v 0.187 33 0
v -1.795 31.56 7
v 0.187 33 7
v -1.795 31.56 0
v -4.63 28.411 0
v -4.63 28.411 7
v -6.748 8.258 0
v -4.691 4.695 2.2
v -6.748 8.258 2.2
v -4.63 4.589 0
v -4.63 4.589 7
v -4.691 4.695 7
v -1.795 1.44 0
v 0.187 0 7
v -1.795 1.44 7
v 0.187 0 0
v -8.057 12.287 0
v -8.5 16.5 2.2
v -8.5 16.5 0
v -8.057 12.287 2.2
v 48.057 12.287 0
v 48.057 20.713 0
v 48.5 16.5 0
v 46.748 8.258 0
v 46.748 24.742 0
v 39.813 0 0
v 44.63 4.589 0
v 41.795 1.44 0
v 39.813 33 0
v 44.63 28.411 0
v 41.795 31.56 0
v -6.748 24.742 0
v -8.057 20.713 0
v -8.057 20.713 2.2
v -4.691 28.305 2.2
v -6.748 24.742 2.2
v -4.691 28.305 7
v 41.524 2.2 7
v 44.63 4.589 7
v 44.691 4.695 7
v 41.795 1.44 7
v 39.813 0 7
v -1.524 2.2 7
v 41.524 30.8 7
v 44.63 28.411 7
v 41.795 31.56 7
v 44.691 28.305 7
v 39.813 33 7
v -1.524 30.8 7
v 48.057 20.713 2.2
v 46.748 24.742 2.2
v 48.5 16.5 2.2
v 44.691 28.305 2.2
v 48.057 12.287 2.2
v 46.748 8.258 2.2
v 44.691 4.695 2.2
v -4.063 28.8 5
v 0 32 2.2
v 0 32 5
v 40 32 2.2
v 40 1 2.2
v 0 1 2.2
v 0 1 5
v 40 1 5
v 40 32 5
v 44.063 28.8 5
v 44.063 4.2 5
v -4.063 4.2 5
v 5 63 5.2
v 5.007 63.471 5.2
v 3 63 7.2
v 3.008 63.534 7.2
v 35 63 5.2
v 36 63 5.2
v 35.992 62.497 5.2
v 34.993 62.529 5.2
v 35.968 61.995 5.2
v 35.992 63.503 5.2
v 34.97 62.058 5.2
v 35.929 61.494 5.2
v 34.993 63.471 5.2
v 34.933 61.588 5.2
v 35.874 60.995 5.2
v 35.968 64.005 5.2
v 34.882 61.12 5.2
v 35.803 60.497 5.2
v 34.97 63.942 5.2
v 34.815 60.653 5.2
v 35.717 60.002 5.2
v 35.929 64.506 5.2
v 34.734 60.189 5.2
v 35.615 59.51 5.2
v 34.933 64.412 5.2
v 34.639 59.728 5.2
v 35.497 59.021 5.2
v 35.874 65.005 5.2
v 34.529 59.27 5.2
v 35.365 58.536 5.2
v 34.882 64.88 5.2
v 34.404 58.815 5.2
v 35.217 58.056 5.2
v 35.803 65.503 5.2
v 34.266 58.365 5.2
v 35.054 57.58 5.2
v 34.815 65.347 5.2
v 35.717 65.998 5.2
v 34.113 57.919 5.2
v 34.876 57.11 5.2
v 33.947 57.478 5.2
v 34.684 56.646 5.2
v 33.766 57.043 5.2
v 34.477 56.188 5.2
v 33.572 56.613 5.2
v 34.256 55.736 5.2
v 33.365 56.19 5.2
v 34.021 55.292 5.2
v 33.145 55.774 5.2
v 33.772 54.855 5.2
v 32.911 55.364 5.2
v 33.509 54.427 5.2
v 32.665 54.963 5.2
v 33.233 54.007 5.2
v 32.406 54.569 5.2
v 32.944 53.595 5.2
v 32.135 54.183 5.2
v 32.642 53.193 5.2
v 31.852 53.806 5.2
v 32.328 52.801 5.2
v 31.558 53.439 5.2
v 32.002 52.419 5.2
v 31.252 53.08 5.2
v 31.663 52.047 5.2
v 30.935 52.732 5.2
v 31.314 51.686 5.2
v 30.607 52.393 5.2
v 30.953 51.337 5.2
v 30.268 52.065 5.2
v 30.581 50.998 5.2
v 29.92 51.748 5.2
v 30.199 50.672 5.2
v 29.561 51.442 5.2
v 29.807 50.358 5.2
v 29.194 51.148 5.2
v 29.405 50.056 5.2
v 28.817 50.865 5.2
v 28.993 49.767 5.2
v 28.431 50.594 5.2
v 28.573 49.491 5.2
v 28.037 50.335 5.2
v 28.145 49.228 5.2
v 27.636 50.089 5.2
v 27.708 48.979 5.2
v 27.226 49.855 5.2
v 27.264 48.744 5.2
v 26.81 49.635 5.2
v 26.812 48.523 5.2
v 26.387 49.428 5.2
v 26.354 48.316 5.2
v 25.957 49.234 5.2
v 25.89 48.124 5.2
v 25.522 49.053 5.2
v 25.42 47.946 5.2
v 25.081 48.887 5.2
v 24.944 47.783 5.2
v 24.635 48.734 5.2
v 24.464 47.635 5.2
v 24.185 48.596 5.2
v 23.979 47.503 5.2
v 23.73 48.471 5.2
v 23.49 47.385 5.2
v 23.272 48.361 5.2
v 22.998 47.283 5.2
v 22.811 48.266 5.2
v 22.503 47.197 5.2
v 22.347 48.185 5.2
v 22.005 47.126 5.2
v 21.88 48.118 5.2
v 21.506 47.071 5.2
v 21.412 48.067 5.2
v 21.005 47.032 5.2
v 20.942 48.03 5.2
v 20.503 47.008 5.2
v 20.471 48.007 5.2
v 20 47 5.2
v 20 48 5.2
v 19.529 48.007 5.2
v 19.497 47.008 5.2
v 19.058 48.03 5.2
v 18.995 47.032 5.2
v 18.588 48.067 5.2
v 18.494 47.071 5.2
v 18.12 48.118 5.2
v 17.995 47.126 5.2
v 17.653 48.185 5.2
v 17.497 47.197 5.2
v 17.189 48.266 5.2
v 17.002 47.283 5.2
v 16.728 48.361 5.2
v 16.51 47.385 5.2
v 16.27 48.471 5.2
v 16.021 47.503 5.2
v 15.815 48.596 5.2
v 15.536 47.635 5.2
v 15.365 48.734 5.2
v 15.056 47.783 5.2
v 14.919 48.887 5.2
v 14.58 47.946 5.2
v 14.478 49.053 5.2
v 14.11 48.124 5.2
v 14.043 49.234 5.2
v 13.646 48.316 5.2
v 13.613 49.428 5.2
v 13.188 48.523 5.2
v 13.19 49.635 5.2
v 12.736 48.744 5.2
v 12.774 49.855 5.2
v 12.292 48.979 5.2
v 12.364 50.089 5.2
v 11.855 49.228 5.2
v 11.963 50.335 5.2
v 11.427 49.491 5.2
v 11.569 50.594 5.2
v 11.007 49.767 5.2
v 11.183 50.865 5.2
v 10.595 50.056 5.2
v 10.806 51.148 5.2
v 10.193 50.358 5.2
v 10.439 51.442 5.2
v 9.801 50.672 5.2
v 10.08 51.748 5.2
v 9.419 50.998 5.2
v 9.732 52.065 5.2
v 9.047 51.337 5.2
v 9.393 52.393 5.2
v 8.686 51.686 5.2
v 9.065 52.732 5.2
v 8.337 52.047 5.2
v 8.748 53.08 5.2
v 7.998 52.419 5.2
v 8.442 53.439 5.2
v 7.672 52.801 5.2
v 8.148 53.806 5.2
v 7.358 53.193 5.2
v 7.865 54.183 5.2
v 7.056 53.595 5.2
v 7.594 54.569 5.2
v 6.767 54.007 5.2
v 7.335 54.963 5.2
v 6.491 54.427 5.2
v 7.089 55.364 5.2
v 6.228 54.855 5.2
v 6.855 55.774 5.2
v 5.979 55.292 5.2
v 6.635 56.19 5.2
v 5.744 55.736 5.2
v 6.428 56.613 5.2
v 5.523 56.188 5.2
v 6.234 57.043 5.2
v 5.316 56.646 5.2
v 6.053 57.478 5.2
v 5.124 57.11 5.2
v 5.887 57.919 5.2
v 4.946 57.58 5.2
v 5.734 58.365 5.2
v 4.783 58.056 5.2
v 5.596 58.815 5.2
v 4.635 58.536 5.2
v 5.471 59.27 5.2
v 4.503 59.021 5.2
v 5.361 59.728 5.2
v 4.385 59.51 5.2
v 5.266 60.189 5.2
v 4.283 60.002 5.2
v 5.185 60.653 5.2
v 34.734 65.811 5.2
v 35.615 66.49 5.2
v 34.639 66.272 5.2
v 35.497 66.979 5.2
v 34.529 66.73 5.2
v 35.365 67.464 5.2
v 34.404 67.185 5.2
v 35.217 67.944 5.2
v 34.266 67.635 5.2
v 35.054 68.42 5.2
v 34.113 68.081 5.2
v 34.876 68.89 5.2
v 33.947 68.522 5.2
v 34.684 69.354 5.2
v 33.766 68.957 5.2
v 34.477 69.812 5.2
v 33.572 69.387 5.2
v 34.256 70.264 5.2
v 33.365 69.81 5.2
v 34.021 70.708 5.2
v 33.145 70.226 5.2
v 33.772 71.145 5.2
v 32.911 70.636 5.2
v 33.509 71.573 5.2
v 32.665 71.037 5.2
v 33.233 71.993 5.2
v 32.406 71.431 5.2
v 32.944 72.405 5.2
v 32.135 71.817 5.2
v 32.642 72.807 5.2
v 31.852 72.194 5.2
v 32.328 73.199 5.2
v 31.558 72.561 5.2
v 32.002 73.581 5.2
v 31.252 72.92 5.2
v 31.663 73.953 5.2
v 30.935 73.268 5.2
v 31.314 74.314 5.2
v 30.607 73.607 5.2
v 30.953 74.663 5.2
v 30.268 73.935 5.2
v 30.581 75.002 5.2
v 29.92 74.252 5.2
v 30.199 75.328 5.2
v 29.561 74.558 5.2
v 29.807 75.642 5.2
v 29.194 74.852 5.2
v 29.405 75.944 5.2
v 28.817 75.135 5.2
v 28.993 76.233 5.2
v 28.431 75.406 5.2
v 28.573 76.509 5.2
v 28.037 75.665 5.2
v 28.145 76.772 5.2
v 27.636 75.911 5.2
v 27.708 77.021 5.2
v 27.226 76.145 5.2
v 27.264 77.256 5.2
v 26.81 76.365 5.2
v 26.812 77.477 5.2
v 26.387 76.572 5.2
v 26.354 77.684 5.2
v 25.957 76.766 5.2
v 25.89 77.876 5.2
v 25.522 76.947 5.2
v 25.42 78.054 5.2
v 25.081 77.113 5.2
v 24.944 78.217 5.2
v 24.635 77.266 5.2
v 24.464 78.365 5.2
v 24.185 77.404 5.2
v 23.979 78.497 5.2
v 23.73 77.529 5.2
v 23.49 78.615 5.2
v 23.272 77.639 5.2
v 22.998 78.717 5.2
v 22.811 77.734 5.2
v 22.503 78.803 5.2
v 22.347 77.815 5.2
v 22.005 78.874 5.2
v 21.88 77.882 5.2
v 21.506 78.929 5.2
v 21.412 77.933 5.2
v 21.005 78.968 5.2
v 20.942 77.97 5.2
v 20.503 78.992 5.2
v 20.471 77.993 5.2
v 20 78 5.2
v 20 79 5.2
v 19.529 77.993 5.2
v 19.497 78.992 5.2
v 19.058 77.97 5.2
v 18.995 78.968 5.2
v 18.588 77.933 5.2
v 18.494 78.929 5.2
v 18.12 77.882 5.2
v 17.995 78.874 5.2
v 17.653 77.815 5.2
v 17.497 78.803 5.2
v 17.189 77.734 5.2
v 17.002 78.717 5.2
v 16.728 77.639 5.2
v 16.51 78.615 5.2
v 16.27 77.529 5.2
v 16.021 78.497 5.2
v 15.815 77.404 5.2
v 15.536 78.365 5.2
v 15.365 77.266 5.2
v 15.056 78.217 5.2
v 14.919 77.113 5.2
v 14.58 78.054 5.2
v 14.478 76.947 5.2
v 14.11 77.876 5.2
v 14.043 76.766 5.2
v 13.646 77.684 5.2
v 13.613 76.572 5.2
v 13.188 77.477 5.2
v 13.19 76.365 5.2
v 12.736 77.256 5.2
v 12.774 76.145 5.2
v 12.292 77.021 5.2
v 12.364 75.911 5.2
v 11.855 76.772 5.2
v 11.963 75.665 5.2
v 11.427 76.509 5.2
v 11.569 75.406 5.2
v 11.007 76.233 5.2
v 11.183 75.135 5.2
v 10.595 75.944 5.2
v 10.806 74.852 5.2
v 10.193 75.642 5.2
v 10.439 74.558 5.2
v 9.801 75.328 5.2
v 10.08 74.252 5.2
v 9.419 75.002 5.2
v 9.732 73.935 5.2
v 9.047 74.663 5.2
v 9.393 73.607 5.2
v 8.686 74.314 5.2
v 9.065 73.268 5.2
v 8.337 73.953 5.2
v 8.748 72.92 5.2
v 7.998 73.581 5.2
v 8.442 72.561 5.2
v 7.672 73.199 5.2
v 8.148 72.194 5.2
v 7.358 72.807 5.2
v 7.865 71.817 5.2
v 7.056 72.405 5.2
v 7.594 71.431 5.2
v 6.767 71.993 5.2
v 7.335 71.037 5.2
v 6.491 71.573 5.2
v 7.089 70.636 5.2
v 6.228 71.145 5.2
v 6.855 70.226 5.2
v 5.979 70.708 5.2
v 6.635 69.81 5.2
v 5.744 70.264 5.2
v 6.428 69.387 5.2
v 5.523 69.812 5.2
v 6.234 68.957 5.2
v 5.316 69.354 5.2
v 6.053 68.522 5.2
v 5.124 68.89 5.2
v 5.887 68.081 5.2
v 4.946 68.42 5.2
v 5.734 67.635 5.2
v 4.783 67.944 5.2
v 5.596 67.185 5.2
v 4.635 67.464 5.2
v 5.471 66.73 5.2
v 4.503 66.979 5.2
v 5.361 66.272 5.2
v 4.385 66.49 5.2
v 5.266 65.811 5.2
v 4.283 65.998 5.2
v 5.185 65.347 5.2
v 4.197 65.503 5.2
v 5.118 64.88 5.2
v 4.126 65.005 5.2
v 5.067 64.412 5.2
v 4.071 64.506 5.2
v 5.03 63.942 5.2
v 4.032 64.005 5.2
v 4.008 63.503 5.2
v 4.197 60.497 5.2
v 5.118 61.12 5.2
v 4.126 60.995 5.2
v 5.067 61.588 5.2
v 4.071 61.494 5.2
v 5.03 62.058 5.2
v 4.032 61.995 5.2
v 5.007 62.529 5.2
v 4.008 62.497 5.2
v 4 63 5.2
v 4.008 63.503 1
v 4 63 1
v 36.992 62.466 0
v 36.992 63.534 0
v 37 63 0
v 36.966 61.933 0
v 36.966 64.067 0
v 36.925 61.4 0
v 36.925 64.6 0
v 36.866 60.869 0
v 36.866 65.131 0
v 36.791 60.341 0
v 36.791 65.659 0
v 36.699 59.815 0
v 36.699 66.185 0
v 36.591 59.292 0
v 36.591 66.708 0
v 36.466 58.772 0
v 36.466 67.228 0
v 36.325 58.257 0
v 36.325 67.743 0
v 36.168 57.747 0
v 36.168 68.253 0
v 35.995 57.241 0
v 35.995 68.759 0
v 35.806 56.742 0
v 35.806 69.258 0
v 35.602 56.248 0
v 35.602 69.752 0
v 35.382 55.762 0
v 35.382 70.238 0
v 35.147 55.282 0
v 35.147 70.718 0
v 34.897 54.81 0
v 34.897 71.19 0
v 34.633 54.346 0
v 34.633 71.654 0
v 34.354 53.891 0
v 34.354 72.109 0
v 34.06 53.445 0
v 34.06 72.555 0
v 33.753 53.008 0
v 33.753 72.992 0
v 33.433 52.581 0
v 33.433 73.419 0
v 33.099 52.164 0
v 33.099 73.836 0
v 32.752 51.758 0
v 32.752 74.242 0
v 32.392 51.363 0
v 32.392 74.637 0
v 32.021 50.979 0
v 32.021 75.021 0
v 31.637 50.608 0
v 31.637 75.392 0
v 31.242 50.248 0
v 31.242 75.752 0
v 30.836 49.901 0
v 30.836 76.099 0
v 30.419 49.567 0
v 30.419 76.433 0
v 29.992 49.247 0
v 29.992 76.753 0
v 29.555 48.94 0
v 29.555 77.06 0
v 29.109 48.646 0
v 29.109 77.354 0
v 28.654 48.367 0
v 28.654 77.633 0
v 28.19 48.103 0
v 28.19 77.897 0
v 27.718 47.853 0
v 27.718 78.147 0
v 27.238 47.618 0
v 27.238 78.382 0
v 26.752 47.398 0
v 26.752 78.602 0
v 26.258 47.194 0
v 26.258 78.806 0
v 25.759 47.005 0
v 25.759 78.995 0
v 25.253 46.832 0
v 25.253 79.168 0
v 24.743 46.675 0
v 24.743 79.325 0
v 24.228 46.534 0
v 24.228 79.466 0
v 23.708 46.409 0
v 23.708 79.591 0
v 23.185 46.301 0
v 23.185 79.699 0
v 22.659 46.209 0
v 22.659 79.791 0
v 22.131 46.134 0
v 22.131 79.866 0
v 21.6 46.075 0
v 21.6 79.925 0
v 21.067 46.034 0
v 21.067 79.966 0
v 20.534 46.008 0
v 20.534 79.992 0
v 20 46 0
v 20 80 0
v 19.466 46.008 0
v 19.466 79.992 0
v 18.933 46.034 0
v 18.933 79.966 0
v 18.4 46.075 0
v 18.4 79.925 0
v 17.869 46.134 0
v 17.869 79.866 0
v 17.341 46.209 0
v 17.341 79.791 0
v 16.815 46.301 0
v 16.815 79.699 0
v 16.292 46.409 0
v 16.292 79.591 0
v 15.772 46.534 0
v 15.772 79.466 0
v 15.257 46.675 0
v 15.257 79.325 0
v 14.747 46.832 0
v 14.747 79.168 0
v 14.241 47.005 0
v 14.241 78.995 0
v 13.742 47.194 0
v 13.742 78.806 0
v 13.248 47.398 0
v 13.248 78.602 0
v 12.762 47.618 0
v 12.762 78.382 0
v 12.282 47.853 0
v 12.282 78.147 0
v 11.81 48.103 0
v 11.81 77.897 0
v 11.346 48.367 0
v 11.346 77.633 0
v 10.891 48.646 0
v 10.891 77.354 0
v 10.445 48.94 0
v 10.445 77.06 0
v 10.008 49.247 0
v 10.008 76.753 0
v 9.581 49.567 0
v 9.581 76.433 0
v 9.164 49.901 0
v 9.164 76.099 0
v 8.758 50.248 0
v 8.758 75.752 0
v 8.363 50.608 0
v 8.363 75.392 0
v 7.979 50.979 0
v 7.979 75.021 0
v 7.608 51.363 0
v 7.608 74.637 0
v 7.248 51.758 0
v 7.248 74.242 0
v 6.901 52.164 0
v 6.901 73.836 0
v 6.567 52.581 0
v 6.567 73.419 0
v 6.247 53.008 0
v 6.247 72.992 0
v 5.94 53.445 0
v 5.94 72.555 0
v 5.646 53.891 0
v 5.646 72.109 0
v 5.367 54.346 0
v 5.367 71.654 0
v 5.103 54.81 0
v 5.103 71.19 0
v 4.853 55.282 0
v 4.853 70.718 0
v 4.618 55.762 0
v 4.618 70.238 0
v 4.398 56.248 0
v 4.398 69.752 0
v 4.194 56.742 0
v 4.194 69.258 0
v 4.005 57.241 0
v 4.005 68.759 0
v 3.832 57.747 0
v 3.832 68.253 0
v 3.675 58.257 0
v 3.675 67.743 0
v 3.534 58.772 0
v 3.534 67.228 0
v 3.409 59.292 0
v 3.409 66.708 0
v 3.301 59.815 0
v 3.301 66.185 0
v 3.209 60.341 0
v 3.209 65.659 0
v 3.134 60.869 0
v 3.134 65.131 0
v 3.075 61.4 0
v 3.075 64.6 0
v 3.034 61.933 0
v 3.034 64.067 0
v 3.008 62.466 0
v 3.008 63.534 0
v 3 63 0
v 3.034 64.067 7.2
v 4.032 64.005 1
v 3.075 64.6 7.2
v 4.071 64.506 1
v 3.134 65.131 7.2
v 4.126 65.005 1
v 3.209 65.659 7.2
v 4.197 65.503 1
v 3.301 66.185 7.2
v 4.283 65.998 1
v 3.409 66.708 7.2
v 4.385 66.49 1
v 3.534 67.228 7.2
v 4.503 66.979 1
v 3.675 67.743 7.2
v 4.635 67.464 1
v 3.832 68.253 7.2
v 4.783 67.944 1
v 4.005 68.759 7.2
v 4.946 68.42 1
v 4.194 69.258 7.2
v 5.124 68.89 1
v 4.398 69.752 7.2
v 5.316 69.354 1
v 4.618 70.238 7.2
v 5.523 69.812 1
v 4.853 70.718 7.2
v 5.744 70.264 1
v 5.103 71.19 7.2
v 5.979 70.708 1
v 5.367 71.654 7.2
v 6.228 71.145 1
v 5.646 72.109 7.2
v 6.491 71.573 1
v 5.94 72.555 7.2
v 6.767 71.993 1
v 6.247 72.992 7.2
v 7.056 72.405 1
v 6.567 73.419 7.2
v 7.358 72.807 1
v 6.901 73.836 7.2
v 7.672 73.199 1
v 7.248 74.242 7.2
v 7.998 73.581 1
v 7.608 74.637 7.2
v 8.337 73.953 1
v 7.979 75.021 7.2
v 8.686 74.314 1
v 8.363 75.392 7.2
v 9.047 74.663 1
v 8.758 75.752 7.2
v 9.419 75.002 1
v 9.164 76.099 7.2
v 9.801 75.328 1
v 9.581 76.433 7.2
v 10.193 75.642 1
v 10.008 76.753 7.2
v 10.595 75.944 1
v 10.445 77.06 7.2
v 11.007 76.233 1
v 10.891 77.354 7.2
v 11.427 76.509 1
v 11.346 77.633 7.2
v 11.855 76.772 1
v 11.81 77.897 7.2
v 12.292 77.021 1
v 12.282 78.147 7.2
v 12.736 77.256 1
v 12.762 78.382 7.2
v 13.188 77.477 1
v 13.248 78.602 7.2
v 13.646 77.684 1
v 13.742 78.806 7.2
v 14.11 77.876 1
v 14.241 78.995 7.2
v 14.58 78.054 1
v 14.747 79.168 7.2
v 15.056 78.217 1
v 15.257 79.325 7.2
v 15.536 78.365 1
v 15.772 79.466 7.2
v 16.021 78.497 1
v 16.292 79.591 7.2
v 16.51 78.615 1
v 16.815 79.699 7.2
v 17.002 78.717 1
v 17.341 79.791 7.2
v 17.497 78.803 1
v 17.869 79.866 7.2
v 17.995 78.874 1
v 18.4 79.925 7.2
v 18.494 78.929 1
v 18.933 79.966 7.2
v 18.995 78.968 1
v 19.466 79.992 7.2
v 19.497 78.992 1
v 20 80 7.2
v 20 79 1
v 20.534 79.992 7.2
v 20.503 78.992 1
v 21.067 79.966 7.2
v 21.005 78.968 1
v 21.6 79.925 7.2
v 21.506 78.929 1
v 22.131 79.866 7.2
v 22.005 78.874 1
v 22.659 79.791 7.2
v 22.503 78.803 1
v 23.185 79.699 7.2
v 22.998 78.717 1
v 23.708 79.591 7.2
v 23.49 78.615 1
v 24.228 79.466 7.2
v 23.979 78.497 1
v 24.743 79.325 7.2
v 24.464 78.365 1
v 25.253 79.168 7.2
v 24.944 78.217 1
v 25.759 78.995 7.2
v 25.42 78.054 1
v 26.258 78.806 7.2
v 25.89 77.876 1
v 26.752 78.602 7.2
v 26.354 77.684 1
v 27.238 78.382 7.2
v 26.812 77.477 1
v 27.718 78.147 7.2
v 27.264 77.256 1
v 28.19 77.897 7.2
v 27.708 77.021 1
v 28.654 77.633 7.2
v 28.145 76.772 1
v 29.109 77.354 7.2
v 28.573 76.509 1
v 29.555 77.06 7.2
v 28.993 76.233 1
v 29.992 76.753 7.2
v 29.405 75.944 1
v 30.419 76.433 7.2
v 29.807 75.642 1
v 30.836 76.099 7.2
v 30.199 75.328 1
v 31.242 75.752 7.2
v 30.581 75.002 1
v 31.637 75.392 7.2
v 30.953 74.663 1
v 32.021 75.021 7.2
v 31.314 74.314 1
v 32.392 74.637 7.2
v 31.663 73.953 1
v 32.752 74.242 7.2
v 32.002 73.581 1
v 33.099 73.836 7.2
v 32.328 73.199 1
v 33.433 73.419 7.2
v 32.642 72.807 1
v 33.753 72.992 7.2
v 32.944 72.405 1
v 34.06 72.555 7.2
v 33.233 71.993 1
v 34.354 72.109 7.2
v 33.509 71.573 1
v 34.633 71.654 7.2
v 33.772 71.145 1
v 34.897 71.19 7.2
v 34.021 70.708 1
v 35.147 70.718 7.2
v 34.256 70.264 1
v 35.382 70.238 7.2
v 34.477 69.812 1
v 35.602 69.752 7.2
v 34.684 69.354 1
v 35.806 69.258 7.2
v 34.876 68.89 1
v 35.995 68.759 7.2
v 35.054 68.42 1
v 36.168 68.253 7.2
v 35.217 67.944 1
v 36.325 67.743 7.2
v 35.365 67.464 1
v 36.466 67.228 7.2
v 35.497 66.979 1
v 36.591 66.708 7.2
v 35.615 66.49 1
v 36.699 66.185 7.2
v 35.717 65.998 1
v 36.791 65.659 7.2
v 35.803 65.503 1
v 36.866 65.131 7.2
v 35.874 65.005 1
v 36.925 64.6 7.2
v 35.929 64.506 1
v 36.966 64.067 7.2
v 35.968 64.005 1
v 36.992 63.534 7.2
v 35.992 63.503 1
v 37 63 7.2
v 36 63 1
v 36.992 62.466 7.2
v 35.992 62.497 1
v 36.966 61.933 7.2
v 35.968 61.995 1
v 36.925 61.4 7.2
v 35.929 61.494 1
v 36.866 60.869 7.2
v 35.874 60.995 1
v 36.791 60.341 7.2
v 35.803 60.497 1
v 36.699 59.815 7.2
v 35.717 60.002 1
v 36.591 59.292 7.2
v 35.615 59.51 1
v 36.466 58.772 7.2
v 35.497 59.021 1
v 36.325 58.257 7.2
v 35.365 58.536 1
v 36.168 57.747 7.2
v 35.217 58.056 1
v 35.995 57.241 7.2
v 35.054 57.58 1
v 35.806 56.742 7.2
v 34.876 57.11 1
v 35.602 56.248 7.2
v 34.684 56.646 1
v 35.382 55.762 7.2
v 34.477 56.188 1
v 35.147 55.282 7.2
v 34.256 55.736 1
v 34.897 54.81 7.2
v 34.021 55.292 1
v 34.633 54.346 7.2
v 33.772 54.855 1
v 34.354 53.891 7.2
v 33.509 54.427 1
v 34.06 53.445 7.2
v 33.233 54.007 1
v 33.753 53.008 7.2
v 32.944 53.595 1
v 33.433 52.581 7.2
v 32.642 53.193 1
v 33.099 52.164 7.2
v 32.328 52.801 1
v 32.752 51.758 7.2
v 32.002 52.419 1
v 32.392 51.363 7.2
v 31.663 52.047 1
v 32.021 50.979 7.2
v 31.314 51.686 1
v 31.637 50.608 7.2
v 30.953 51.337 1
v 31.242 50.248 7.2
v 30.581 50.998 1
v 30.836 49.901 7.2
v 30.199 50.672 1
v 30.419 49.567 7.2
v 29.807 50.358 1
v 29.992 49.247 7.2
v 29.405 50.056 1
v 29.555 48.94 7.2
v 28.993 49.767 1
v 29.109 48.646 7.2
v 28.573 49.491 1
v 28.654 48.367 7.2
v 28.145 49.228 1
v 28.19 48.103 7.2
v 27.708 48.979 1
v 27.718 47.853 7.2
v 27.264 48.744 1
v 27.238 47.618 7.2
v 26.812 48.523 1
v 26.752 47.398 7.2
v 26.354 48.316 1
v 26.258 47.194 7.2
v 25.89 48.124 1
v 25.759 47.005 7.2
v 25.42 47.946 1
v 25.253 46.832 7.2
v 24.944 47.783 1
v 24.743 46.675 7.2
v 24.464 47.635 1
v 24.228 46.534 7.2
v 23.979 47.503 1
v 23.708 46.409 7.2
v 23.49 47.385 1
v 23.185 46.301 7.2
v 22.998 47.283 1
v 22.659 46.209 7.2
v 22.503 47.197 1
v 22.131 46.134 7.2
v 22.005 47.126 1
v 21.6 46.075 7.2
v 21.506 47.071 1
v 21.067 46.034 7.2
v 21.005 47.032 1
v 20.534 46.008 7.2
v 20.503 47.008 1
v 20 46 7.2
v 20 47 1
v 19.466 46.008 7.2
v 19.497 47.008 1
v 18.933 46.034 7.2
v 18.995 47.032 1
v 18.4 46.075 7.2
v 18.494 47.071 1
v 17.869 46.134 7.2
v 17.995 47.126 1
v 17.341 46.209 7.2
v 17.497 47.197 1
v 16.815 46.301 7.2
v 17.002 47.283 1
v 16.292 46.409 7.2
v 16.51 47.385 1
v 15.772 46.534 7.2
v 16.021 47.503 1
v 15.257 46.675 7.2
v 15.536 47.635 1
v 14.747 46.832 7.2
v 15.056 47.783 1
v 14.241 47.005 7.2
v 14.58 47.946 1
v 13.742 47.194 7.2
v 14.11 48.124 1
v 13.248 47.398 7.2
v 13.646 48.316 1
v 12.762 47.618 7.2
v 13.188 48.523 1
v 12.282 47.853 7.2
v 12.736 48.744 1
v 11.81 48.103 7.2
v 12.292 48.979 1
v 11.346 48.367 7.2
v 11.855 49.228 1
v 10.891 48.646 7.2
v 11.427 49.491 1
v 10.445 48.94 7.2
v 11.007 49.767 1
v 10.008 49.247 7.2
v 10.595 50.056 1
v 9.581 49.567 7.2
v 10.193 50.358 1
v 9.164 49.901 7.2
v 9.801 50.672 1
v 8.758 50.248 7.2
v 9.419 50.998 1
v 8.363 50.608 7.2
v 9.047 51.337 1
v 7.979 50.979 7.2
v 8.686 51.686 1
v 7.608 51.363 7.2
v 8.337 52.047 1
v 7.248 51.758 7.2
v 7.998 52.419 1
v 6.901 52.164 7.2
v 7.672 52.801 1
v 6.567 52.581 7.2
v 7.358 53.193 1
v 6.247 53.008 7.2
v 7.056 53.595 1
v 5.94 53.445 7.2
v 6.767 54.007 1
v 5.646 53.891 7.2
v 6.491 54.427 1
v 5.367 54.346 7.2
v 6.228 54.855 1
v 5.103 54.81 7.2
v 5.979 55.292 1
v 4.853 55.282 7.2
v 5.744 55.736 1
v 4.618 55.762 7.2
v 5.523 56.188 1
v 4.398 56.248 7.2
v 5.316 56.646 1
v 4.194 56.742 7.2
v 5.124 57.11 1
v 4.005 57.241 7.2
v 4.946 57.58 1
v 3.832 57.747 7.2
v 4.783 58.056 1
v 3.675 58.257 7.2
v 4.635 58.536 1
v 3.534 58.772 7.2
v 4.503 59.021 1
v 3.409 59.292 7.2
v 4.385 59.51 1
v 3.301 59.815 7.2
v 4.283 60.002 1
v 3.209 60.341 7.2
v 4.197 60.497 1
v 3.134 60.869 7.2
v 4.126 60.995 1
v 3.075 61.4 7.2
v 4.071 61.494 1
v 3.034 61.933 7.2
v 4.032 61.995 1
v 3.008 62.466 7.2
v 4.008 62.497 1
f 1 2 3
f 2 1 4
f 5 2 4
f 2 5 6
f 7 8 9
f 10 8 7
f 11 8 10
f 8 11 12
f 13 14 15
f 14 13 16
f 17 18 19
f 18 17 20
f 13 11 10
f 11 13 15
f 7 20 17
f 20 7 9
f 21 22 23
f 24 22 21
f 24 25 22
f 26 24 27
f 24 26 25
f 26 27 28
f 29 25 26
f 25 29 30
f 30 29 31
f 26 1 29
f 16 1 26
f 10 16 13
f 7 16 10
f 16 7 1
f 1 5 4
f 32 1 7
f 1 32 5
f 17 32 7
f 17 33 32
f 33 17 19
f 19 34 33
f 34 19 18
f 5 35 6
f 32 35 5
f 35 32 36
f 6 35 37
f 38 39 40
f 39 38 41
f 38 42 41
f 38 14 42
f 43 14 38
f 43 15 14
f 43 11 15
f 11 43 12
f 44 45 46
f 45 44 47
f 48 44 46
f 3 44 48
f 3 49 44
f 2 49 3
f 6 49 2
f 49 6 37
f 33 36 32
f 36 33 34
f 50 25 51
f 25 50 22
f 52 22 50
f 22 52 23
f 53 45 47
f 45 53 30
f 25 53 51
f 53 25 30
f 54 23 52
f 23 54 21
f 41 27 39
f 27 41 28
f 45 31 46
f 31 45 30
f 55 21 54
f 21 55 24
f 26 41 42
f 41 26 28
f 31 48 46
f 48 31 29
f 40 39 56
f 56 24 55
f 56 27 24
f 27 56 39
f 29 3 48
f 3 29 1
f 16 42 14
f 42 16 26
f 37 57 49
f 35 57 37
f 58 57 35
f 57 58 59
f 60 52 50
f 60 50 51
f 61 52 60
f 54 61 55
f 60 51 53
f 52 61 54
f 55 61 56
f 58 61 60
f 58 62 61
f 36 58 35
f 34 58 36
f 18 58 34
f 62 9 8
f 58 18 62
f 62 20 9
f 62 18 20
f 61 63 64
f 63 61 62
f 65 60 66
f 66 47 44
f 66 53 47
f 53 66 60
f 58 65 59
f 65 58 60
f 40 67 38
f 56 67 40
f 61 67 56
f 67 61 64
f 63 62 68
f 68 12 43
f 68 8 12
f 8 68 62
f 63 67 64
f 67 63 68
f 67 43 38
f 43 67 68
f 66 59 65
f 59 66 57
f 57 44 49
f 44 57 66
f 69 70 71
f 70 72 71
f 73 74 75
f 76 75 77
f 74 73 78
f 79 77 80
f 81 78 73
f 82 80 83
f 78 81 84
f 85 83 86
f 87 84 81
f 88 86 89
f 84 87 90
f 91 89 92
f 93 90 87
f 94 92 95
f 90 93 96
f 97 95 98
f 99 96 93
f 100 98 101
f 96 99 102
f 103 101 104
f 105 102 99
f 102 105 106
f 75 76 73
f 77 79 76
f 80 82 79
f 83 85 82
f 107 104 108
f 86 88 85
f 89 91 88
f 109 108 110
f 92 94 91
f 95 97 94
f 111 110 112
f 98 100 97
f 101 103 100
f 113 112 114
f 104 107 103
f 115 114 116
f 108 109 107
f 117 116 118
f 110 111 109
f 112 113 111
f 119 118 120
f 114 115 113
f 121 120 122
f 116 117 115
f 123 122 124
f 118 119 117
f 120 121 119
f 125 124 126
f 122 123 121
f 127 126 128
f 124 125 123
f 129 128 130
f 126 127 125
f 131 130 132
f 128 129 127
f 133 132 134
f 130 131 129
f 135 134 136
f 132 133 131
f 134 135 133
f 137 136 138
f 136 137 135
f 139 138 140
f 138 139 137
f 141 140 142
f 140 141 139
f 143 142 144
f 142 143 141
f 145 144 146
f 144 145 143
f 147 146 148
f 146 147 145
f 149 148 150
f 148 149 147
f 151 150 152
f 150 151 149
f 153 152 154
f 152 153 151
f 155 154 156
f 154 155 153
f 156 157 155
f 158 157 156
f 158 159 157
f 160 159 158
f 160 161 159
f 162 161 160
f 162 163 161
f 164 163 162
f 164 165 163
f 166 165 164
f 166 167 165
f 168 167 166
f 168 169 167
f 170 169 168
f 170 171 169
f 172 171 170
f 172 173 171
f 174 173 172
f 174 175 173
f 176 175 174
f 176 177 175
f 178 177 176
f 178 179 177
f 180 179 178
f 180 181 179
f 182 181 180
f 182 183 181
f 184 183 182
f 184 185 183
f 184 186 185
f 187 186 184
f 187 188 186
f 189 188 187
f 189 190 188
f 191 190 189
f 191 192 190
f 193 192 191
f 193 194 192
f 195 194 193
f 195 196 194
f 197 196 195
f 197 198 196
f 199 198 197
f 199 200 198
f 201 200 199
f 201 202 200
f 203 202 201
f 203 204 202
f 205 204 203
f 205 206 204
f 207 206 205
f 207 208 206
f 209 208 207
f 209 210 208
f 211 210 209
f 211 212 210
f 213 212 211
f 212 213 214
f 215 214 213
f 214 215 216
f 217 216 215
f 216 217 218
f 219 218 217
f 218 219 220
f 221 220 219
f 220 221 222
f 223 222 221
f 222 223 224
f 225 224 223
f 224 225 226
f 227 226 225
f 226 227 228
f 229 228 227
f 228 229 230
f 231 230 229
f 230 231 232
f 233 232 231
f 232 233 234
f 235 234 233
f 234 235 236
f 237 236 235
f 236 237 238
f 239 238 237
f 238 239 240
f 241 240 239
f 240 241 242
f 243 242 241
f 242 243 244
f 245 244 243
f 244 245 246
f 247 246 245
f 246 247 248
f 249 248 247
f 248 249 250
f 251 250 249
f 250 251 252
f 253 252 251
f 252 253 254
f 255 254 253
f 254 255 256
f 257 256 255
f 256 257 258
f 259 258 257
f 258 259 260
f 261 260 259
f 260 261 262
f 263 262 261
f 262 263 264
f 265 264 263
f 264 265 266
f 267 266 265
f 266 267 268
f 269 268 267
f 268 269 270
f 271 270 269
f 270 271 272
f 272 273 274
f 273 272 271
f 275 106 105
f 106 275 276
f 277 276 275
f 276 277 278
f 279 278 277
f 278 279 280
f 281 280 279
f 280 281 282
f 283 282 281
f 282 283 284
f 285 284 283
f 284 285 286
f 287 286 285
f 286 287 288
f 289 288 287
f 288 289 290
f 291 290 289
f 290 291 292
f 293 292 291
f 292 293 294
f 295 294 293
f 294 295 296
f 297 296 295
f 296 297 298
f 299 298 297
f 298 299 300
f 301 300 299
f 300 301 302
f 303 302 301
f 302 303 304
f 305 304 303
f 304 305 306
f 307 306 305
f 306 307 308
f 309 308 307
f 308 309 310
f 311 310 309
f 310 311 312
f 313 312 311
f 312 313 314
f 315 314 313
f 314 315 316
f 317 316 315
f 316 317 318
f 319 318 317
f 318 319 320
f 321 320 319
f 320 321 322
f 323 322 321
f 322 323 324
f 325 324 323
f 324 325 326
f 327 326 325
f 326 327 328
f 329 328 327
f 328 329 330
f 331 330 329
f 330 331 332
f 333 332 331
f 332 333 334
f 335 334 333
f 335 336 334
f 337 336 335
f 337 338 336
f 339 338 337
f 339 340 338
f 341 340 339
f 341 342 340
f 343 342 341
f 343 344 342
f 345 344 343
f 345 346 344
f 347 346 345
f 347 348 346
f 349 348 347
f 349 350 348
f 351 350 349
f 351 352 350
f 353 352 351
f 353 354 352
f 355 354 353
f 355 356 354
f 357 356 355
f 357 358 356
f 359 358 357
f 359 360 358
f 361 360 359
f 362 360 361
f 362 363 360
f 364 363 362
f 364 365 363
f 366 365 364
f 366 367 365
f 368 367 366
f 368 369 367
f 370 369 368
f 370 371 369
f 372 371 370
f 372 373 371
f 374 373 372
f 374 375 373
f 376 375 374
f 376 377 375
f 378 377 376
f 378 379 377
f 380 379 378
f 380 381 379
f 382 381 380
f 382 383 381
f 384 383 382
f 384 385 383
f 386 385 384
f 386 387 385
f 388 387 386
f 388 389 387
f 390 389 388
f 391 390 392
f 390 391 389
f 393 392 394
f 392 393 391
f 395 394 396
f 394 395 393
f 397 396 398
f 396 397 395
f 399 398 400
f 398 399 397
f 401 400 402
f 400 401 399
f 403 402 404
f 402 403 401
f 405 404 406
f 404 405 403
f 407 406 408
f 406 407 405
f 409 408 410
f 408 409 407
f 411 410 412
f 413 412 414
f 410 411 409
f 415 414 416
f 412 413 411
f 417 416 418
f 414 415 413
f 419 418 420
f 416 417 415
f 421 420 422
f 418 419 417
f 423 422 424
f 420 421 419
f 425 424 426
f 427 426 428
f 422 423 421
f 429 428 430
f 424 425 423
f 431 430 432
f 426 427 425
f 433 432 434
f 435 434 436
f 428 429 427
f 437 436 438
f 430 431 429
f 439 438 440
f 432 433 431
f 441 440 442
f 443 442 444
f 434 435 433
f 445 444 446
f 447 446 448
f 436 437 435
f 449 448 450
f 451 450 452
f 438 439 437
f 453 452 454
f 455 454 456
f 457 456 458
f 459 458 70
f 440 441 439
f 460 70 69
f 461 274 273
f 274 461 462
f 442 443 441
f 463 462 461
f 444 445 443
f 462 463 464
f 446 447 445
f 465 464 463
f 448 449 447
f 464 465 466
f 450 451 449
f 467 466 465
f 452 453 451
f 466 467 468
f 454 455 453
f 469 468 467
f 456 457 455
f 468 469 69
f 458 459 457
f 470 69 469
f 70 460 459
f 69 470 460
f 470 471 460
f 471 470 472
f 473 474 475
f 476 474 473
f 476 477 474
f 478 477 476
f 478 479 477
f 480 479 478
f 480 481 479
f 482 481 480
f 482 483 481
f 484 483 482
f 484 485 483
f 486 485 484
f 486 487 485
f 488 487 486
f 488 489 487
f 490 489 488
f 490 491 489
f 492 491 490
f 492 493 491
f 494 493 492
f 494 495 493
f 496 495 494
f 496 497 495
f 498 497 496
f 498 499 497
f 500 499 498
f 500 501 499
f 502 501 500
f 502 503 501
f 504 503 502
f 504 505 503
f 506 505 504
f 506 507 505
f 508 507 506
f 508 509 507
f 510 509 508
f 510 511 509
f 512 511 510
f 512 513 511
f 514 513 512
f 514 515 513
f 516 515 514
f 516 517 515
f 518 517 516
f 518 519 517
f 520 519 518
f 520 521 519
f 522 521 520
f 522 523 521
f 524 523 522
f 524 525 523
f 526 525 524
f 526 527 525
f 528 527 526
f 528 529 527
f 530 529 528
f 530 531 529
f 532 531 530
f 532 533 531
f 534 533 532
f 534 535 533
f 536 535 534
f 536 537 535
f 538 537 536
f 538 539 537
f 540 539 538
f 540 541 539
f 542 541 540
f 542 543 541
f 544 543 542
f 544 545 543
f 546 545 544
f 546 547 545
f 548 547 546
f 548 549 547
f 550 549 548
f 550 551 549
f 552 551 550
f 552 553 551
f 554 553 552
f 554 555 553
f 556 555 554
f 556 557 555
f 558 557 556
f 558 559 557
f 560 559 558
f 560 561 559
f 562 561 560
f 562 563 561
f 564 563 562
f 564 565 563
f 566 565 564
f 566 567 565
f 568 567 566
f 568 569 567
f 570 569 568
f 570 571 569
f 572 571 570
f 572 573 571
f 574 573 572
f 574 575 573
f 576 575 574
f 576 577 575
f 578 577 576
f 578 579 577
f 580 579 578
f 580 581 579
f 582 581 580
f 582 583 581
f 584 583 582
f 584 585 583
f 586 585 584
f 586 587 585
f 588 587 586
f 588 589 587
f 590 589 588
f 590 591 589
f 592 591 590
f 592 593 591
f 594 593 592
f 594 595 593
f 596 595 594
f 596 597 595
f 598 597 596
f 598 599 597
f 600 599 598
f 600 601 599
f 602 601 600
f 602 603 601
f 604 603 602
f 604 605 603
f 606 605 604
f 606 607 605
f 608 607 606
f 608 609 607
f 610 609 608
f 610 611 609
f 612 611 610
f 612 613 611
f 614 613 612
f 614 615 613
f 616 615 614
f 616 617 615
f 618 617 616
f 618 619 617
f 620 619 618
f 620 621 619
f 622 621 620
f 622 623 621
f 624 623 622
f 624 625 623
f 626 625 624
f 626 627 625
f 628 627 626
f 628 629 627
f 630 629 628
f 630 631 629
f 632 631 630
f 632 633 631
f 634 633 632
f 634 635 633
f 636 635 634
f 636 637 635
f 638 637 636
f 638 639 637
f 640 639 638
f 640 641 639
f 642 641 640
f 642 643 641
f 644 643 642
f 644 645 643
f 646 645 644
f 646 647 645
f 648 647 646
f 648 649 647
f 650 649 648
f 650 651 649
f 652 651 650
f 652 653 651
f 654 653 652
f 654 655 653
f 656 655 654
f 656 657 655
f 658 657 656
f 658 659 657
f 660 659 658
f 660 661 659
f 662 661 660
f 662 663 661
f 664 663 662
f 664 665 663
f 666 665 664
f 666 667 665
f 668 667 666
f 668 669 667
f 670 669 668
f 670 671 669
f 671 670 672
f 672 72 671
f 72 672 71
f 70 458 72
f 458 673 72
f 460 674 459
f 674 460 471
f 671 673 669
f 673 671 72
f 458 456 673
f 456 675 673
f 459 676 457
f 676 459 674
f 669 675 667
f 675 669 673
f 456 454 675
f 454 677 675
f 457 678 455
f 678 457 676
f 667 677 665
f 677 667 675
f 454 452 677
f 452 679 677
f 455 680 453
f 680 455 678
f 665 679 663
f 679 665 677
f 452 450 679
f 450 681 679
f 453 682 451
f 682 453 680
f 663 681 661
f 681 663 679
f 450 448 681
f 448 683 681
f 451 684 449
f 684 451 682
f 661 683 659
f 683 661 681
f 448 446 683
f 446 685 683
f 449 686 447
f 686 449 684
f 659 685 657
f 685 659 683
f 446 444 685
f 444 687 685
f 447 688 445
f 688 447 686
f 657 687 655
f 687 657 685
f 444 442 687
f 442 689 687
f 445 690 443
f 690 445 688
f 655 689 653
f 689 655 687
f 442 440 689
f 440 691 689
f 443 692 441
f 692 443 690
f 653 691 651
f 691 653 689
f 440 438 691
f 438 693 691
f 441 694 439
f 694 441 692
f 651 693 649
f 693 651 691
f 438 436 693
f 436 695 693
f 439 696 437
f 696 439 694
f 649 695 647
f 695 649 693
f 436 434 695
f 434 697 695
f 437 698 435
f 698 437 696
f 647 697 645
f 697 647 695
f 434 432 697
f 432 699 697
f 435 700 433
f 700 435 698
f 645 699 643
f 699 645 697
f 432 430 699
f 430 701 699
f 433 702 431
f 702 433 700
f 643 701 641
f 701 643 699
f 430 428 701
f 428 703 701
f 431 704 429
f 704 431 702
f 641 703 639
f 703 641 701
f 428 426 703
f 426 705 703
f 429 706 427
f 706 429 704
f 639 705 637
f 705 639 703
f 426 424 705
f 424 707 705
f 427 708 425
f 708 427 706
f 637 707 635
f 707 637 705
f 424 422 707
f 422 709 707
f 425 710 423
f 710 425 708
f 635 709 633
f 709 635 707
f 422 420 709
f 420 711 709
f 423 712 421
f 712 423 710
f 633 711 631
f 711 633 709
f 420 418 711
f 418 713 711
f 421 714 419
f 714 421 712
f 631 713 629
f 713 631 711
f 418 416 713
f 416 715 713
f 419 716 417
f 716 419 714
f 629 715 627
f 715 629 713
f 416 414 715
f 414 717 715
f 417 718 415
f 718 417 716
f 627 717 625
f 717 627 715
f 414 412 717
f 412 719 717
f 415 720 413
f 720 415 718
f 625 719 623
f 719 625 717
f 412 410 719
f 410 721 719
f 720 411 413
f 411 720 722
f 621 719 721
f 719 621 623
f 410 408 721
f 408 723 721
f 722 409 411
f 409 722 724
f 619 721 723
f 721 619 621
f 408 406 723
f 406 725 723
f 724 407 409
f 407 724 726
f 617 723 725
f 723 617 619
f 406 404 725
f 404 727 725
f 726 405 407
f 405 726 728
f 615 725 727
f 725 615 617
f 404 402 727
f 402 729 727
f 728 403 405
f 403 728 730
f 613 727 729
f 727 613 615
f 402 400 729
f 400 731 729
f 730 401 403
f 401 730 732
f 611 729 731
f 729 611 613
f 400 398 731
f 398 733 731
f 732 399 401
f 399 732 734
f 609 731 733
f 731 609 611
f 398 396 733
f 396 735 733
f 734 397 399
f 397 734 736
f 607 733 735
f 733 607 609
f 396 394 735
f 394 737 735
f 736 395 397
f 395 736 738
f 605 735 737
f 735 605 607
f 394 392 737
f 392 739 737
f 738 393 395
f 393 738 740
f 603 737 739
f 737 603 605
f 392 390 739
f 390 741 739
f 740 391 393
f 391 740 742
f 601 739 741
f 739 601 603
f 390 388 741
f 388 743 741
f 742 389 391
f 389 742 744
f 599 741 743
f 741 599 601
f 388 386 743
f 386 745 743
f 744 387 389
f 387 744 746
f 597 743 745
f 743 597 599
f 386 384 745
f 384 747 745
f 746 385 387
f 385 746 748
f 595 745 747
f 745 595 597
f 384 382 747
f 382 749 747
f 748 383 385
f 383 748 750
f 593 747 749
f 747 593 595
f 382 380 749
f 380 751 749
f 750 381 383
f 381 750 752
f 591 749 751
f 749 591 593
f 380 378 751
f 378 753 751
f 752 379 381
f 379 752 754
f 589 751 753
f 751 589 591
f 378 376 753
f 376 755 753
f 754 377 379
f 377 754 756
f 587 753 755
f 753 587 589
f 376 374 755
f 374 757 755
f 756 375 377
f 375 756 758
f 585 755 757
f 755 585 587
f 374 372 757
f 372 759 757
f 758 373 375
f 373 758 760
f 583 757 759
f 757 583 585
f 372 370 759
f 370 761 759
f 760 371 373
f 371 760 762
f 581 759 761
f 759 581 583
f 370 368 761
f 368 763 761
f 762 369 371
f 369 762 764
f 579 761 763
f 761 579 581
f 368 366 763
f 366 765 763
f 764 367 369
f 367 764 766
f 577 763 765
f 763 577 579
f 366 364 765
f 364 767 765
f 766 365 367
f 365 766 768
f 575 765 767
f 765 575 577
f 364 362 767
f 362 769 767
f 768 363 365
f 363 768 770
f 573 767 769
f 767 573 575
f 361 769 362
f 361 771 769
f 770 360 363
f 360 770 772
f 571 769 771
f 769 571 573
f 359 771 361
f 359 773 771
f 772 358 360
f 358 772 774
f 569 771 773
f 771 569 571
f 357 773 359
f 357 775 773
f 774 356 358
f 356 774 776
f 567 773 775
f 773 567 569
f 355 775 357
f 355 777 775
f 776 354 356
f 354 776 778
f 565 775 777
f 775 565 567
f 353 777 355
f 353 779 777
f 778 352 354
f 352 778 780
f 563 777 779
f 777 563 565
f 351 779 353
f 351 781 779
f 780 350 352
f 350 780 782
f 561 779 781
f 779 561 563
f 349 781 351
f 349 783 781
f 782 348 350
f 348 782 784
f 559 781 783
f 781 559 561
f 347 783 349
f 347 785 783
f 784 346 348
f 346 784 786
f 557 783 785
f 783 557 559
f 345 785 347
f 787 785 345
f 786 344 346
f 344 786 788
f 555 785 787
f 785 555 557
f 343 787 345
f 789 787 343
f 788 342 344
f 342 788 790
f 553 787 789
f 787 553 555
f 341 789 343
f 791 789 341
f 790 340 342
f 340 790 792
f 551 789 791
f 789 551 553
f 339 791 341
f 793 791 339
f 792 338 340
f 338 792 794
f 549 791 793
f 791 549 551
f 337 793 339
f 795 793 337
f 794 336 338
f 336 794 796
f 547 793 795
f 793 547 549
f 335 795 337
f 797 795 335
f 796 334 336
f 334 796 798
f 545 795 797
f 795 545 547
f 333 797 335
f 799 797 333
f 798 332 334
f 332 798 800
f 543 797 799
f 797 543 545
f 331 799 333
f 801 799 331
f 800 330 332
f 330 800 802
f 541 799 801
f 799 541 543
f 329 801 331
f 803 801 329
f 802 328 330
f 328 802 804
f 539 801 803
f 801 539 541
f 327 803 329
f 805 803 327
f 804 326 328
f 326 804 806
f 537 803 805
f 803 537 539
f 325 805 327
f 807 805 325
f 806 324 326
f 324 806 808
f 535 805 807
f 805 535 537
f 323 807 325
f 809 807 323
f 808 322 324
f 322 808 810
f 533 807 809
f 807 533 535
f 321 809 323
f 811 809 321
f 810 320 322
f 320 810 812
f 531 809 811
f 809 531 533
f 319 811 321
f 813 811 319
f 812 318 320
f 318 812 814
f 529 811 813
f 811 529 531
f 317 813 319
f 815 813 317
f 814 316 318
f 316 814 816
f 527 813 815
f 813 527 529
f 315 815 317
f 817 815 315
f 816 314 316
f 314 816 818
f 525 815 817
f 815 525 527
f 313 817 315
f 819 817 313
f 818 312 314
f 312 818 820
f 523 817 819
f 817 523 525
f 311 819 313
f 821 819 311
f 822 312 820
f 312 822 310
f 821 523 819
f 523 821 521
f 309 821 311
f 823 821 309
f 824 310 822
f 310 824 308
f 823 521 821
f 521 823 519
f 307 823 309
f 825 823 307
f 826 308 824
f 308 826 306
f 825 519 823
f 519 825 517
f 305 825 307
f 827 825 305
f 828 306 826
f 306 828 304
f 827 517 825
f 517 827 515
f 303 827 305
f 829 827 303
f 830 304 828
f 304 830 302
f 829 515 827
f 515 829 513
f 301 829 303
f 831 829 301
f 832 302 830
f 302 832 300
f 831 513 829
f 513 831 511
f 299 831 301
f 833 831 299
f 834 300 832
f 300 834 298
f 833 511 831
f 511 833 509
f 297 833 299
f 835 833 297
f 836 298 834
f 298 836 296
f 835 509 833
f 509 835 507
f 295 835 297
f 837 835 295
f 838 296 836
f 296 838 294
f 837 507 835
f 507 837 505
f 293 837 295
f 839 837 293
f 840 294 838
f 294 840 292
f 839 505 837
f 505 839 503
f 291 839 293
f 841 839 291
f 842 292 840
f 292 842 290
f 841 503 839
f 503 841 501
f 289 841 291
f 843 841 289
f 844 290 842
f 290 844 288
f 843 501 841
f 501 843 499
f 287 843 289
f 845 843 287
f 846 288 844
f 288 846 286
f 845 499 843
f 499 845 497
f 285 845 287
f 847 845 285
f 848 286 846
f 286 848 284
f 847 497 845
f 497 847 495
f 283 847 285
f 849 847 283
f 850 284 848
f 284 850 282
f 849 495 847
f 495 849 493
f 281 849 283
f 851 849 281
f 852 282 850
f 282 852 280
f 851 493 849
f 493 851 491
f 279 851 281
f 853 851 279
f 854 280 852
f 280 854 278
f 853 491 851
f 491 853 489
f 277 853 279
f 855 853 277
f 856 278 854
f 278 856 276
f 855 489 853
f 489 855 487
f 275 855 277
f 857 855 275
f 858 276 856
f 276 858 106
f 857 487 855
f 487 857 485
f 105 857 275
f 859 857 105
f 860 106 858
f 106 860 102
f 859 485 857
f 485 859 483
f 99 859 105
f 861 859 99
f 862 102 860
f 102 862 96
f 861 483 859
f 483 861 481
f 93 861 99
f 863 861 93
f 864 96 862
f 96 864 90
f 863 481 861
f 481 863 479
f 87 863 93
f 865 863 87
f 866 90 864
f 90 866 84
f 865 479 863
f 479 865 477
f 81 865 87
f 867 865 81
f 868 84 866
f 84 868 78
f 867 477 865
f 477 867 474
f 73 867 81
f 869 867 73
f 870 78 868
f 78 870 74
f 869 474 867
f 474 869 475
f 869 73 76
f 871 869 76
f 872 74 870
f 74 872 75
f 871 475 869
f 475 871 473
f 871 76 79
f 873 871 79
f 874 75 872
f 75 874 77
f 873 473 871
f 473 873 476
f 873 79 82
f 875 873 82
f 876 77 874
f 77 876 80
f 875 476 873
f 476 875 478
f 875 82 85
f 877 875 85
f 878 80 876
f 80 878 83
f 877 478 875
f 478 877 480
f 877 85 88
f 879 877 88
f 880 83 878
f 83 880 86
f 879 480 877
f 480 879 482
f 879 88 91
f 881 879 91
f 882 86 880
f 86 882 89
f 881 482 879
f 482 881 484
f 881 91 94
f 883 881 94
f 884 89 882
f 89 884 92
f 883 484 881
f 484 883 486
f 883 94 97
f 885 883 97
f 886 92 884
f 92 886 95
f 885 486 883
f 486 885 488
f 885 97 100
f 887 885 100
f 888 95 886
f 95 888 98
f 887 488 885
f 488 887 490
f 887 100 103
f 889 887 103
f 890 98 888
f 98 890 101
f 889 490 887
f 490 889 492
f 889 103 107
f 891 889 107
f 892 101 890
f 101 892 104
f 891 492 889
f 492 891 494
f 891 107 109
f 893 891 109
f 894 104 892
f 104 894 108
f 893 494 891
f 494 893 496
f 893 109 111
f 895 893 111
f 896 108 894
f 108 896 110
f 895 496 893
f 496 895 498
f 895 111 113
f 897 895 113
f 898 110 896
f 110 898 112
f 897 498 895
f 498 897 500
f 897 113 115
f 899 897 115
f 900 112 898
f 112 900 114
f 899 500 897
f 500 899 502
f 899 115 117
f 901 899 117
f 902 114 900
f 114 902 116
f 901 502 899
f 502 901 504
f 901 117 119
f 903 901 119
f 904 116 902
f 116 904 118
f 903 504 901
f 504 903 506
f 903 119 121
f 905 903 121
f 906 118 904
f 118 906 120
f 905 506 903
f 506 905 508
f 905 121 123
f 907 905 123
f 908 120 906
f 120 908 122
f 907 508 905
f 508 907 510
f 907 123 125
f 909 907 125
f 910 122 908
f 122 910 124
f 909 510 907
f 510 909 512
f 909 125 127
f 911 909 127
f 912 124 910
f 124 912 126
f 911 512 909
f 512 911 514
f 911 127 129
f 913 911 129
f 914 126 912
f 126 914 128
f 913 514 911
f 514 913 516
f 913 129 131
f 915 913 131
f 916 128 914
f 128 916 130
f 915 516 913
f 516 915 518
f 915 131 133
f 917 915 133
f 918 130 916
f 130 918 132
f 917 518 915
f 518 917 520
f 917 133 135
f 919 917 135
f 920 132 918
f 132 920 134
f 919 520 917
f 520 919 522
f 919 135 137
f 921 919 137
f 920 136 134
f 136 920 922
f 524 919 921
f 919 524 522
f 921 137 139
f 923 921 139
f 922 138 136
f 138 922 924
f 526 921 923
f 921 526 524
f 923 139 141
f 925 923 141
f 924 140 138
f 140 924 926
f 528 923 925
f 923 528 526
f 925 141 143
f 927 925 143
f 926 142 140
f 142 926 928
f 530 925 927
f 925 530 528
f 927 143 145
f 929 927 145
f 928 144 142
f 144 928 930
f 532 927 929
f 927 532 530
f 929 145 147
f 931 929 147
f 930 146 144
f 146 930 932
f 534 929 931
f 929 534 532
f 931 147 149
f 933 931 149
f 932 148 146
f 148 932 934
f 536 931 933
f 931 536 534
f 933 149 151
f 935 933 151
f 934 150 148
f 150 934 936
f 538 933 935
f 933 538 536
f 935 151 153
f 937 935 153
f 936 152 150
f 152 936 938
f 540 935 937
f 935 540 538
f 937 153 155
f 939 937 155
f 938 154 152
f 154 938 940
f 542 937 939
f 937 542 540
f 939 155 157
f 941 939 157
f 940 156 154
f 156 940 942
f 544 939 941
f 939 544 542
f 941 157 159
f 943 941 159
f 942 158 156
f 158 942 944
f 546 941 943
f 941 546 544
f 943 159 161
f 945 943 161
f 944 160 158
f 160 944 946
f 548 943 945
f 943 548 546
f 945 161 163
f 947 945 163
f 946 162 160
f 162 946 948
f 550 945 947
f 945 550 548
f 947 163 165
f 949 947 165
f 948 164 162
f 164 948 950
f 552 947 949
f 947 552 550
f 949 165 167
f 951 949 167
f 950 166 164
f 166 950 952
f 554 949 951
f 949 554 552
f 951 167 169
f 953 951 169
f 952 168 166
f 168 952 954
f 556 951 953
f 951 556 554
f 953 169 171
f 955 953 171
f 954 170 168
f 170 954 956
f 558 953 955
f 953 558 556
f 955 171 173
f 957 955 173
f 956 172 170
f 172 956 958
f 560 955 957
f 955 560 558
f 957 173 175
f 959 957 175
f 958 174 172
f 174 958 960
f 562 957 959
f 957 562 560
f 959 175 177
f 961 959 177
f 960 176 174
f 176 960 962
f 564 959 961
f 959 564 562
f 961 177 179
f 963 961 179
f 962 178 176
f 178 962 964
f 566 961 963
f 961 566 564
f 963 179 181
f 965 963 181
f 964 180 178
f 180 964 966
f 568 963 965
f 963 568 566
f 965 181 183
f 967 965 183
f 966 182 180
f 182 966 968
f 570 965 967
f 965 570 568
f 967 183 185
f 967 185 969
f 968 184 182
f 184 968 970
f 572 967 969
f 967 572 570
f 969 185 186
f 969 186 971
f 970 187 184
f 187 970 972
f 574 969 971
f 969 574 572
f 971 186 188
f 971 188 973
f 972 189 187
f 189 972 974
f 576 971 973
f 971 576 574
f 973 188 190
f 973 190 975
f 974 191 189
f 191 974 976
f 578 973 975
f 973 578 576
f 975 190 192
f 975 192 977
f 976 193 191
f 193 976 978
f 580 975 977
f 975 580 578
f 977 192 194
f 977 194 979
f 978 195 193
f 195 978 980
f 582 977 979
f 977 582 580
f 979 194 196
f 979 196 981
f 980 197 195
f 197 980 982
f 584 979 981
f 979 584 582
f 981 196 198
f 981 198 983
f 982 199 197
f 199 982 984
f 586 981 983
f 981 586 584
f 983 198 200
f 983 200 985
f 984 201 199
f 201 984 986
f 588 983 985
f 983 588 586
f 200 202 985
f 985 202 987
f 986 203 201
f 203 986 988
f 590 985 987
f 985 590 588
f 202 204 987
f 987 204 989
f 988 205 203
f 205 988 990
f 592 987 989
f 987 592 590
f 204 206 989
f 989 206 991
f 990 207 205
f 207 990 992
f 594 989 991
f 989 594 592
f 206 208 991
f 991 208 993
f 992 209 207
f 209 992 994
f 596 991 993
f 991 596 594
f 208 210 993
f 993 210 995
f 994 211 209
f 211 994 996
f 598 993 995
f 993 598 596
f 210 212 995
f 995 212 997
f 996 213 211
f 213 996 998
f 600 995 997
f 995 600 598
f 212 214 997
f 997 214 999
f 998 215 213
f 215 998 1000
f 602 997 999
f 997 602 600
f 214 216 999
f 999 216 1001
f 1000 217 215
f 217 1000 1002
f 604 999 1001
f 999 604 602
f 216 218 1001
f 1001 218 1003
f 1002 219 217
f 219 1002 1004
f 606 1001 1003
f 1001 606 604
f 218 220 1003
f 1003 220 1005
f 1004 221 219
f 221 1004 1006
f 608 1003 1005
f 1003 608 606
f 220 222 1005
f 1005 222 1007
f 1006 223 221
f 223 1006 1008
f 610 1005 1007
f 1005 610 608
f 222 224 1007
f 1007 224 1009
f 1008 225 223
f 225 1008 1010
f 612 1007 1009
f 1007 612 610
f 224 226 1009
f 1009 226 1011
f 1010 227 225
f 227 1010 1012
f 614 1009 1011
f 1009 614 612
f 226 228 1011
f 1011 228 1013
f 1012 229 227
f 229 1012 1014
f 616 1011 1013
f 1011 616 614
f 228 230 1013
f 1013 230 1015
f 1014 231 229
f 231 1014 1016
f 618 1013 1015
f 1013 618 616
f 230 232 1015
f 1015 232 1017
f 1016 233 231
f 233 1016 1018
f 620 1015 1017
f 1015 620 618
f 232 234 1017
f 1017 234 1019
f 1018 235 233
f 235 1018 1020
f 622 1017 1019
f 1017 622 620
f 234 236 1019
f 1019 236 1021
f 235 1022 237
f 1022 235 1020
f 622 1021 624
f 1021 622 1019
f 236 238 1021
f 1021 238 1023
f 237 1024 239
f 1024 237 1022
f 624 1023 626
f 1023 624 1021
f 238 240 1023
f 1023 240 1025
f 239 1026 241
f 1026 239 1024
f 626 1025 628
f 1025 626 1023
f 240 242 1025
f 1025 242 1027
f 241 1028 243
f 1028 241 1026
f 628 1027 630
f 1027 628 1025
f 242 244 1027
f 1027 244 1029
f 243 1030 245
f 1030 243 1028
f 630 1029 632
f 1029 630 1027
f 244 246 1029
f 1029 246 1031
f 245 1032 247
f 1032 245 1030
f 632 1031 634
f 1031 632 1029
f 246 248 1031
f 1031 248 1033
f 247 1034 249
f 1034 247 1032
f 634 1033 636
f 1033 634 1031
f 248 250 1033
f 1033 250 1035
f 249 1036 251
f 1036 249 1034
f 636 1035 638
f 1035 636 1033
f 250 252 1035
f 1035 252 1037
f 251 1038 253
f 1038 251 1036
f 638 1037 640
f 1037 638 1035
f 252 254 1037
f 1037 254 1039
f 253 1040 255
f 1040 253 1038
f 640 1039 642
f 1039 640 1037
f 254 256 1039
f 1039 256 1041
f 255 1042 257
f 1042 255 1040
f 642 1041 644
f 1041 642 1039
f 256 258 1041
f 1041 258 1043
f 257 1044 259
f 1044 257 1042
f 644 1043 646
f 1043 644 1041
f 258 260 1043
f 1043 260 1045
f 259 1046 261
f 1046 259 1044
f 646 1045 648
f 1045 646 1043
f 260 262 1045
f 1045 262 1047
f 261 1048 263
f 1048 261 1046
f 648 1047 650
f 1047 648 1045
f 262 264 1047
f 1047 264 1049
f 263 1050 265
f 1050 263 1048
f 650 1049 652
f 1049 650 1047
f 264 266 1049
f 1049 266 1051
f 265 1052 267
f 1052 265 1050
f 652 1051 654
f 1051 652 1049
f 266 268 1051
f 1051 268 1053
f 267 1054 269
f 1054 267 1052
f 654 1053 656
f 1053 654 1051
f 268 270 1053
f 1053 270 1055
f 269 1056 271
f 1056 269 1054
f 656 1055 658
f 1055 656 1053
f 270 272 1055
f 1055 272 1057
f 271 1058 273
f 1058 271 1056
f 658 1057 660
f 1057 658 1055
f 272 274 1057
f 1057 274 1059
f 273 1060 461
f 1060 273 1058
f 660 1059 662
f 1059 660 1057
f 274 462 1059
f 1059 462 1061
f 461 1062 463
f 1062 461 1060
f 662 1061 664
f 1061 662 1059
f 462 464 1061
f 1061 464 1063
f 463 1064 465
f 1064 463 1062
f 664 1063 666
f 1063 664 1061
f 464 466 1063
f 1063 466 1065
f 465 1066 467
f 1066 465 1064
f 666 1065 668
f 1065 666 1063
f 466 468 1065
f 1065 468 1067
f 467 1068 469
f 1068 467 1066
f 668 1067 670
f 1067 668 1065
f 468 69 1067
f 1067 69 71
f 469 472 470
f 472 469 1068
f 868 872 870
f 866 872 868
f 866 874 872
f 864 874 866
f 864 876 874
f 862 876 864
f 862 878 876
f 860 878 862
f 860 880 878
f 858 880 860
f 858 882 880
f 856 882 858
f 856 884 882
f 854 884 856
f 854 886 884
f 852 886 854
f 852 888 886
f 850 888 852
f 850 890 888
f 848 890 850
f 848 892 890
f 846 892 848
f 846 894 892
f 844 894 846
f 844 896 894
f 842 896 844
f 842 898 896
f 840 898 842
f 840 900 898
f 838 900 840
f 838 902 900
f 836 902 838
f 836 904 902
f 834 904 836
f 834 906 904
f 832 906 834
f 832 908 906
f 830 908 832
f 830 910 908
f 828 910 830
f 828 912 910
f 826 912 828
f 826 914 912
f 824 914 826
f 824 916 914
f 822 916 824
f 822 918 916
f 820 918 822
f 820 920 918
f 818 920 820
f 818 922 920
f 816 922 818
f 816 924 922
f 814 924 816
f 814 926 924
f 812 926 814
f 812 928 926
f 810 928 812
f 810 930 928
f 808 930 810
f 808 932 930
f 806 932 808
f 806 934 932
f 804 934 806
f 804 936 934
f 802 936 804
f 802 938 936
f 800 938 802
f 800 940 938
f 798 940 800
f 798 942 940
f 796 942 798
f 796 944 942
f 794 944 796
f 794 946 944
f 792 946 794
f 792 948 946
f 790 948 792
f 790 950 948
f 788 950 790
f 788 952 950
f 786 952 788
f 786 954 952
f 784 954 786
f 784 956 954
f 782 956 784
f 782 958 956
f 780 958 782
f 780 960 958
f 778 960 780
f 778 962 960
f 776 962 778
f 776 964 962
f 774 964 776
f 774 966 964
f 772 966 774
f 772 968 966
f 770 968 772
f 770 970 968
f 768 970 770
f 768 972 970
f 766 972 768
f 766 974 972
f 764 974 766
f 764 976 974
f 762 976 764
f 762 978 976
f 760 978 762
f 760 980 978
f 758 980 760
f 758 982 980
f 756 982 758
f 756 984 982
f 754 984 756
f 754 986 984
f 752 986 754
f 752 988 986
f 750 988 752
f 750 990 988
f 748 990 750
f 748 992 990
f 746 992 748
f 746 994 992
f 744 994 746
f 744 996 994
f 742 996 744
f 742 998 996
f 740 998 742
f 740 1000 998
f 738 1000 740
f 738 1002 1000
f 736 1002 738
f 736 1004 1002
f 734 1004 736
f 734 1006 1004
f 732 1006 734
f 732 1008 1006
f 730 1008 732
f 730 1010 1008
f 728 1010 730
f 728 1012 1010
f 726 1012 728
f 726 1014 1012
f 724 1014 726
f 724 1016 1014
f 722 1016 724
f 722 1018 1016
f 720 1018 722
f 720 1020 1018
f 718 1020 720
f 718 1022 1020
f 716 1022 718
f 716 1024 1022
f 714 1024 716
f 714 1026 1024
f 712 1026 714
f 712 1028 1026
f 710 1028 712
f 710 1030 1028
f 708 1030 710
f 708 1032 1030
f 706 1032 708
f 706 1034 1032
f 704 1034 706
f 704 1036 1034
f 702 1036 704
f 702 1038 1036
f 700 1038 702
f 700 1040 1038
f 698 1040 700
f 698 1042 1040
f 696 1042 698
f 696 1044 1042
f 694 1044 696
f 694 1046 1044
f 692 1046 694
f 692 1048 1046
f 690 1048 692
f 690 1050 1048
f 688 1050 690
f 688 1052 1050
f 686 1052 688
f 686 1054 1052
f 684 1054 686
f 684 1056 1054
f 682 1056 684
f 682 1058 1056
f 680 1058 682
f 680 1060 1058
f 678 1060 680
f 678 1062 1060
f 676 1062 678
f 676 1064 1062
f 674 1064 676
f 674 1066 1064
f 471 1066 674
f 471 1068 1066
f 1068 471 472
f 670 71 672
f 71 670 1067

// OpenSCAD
c_height = 7.2;
c_radius = 17;
c_internal_radius = 15;
c_width = 1;

r_width = 33;
r_length = 40;
r_height = 7;
r_side_arrow = 8.5;
r_side_width = 4.2;
r_bottom_thickness = 2.2;
r_side_thickness = 1;
r_top_thickness = 2;
r_internal_angle_length = 8;
r_internal_angle_width = 5;
// Calculation of radius from arrow & width
r_side_radius = pow(r_width,2)/(8*r_side_arrow)+r_side_arrow/2;

module circlePad() {
    rotate_extrude($fn=200)
    polygon([[0,0],[c_radius,0],[c_radius,c_height],[c_internal_radius,c_height-2*c_width],[c_radius-c_width,c_height-2*c_width],[c_radius-c_width,c_width],[0,c_width]]);
}

module rectanglePadBase() {
    intersection() {
        union() {
            translate([r_side_radius-r_side_arrow, r_width/2, 0])
            cylinder(r_height, r_side_radius, r_side_radius);

            translate([r_length+r_side_arrow-r_side_radius, r_width/2, 0])
            cylinder(r_height, r_side_radius, r_side_radius);
        };

        translate([-r_side_arrow,0,0])
            cube([r_length+2*r_side_arrow,r_width,r_height]);
    };
}

module suspendedChemfer() {
    //color("red")
    translate([3/2*r_length,0,r_height-r_top_thickness])
    rotate([0,-90,0])
    linear_extrude(r_length*2)
    polygon([[0,0],[0,r_side_width],[r_top_thickness,r_side_width-r_top_thickness],[r_top_thickness,0]]);
}

module rectanglePad() {
    difference() {
        
        rectanglePadBase();

        union() {
            translate([0,0,r_bottom_thickness])
            linear_extrude(r_height)
            union() {
                polygon([[r_length,r_side_thickness],[r_length+r_internal_angle_length*(r_width-2*r_side_width)/2/r_internal_angle_width,r_width/2],[r_length,r_width-r_side_thickness]]);
                polygon([[0,r_side_thickness],[-r_internal_angle_length*(r_width-2*r_side_width)/2/r_internal_angle_width,r_width/2],[0,r_width-r_side_thickness]]);
                translate([0,r_side_thickness,0])
                    square([r_length, r_width-2*r_side_thickness]);
            }
        }
    }
    
    // Suspended chamfer
    suspendedChemfer();
    translate([0,r_width,0])
    mirror([0,1,0])
    suspendedChemfer();
}

translate([r_length/2,r_width + 30,0])
circlePad();

intersection() {
    rectanglePadBase();
    rectanglePad();
}
